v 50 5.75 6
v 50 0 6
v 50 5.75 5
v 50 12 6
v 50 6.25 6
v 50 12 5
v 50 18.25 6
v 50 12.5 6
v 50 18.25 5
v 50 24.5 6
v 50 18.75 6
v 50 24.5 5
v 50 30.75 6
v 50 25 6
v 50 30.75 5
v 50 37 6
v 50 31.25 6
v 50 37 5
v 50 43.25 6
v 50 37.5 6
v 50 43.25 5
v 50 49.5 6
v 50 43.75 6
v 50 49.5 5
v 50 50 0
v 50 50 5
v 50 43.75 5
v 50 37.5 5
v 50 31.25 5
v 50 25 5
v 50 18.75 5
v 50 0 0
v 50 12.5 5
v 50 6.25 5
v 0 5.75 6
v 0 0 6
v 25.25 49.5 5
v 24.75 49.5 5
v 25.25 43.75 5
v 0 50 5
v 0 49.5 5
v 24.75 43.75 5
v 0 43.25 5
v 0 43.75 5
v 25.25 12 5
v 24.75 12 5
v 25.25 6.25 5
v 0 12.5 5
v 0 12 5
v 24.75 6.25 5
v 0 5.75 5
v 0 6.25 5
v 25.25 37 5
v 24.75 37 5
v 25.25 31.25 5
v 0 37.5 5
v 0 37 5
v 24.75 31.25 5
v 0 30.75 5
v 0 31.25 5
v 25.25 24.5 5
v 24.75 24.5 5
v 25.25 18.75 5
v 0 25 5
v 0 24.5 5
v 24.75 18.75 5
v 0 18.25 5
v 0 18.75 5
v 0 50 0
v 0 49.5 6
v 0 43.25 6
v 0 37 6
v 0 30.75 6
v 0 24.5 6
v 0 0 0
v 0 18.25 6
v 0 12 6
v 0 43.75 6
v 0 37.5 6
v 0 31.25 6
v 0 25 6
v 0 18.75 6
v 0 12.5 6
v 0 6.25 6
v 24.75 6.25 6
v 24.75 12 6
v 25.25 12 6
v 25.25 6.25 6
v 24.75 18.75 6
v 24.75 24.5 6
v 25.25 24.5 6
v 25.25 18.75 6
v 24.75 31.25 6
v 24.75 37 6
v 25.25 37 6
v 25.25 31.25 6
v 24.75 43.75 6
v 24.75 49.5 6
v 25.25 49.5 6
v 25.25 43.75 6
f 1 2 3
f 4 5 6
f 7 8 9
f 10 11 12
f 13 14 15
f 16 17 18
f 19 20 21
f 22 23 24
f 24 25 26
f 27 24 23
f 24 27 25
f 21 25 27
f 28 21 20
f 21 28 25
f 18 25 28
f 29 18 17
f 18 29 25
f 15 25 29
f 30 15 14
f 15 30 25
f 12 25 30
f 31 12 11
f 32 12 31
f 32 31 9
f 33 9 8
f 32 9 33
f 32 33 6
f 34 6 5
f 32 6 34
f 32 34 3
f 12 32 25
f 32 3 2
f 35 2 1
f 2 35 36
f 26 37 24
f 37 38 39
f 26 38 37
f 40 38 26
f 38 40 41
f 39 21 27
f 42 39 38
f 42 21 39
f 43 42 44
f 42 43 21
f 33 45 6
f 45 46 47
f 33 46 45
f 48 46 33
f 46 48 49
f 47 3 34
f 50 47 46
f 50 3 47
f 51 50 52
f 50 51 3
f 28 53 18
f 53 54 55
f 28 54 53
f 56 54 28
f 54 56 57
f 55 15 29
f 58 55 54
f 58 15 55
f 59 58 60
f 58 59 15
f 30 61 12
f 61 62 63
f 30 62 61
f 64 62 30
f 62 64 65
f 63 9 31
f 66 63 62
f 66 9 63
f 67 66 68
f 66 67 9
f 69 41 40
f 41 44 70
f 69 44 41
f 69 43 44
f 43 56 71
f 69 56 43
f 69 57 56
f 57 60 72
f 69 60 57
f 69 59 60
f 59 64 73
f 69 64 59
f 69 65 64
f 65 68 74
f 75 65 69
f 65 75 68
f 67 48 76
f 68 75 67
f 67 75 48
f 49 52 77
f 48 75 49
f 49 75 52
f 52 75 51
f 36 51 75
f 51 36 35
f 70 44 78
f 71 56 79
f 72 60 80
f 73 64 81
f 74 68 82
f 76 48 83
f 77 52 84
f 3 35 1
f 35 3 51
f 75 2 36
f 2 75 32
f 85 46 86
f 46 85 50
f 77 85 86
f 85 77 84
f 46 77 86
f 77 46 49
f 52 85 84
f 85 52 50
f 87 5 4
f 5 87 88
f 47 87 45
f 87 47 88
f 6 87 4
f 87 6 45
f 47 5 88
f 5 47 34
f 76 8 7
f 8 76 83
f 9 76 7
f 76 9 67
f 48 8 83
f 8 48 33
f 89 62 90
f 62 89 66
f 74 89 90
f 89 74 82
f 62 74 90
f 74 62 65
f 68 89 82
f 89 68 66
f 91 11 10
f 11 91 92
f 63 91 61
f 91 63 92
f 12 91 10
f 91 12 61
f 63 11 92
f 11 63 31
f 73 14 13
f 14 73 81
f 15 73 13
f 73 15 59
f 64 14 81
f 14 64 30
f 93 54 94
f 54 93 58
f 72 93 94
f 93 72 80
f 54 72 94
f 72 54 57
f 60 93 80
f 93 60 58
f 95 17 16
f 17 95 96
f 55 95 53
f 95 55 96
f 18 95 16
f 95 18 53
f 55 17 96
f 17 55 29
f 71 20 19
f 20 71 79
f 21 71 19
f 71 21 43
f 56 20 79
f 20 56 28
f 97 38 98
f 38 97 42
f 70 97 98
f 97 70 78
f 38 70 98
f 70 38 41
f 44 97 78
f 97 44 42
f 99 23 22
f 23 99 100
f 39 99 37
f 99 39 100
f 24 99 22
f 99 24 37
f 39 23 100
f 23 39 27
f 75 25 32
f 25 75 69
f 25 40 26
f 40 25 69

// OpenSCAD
woodTile();
module woodTile(width = 50, depth = 50, plankCount = 7, printConnectorHoles = false) {
    tileHeigth = 5;
    difference() {
        cube([width, depth, tileHeigth]);
        connectorCount = 2;

        if(printConnectorHoles) {
            union() {
                translate([width / 2, depth / 2])
                for(n = [0:1:4]) {
                    rotate([0,0,90*n])
                    translate([-width / 2, -depth / 2])
                    for(i = [1:1:connectorCount]) {
                        translate([(width / (connectorCount + 1)) * i, 0, tileHeigth / 2])
                        rotate([90,0,0])
                        connector();
                    }
                }
            }
        }
    }
    spacing = 0.5;
    plankWidth = width / (plankCount + 1) - spacing;
    plankHeight = 1;
    translate([0,0,tileHeigth])
    for(i = [0:1:plankCount/2]) {
        translate([0,(plankWidth + spacing) * i * 2,0]) {
            //Long bar
            cube([width,plankWidth,plankHeight]);
            //2 short bars
            translate([0, plankWidth + spacing])
            cube([(width - spacing) / 2,plankWidth,plankHeight]);
            translate([(width + spacing) / 2, plankWidth + spacing])
            cube([(width - spacing) / 2,plankWidth,plankHeight]);
        }
    }
}

module connector() {
    length = 10;
    width = 4;
    intersection() {
        hull() {
            translate([0,0,length / 2 - width / 2])
            sphere(r = width/2, $fn = 8);
            translate([0,0,-length / 2 + width / 2])
            sphere(r = width/2, $fn = 8);
        }
        union() {
            cube([width / 3, width, length], center = true);
            cube([width, width / 3, length], center = true);
        }
    }
}
